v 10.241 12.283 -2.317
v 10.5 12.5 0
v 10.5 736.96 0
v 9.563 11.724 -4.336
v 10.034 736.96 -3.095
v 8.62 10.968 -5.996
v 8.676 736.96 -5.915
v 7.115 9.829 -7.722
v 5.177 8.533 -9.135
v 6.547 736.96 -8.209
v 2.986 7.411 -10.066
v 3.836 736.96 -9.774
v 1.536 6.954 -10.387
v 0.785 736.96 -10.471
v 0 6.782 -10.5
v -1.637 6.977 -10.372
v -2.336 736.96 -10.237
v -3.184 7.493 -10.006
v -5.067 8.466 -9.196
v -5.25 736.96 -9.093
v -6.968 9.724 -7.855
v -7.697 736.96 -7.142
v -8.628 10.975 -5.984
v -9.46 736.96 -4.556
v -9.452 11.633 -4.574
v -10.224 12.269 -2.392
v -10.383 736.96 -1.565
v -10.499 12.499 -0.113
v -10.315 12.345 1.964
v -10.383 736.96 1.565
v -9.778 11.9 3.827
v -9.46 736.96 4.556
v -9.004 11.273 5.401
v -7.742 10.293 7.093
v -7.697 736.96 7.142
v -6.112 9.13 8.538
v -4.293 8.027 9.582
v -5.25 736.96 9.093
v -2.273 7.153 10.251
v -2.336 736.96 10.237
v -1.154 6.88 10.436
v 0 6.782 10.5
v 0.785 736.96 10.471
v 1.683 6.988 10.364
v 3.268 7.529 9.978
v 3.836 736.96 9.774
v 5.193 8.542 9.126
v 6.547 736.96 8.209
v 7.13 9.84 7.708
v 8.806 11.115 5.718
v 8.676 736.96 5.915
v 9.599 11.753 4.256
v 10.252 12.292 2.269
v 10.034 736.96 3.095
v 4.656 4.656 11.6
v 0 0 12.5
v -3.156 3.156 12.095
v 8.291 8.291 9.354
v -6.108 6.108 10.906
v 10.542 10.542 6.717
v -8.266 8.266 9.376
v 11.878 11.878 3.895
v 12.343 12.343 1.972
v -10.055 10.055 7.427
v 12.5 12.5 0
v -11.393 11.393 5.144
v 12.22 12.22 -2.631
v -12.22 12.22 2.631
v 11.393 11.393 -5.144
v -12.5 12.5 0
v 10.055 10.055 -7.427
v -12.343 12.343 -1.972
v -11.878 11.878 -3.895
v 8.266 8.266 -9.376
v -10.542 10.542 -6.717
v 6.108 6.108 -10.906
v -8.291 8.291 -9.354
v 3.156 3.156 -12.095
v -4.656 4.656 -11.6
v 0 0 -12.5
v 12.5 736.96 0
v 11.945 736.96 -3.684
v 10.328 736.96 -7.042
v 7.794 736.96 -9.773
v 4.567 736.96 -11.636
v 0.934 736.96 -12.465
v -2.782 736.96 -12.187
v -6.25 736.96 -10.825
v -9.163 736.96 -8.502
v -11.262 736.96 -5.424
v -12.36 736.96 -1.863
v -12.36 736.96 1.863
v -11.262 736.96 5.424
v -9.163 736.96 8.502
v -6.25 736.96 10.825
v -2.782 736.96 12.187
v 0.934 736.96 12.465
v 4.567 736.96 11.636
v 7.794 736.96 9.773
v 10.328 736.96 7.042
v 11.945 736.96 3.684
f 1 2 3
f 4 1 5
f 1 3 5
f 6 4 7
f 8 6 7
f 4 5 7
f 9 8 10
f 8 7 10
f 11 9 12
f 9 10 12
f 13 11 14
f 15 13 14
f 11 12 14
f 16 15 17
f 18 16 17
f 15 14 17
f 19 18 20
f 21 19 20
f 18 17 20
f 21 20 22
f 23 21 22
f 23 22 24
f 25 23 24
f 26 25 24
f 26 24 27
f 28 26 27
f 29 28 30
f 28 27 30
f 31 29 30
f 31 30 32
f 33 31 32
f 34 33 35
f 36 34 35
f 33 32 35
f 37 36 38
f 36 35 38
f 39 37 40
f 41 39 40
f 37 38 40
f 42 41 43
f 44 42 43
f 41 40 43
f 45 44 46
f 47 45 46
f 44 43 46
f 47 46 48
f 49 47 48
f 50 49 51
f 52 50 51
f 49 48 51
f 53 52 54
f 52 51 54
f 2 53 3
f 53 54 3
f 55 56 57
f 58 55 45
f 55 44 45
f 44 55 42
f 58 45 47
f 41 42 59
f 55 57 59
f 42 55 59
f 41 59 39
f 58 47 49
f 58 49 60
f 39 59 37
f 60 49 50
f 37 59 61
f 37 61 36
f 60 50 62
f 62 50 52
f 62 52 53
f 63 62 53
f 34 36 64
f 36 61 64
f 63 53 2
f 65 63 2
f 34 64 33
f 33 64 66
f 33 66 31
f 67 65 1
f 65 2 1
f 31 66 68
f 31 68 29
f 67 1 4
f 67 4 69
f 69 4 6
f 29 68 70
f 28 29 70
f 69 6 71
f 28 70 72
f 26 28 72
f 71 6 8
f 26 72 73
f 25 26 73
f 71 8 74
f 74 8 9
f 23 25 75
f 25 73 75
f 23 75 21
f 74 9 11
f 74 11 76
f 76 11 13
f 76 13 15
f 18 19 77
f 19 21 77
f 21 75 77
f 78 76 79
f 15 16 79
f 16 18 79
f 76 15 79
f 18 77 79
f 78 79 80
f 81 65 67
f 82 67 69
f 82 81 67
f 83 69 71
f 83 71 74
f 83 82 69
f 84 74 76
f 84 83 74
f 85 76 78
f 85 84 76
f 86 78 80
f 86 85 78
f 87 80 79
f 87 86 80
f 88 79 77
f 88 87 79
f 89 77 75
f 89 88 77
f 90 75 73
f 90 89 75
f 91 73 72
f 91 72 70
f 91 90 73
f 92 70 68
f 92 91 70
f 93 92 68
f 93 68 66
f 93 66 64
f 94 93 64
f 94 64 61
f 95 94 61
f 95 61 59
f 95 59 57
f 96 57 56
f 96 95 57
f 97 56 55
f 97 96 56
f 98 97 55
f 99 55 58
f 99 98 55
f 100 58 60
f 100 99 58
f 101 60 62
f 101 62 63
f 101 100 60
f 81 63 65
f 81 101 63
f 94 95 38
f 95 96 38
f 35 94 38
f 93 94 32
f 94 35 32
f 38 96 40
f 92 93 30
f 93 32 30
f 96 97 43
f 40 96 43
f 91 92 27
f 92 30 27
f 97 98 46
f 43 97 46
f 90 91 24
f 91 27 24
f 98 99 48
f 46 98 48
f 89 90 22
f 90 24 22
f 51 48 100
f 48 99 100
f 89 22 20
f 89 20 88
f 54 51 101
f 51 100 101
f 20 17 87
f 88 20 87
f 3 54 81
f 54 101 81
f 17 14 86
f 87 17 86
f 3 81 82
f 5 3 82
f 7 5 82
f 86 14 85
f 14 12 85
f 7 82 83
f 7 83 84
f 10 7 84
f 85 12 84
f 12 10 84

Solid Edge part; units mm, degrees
sketch "Sketch1" plane through (0, 0, 0) normal (0, 0, 1) x (1, 0, 0)
  line L0 (0, 0) -> (0, 736.96)
  dimension "D1" = 736.96
sketch "Sketch2" plane through (0, 0, 0) normal (0, -1, 0) x (1, 0, 0)
  circle A0 centre (0, 0) radius 12.5
  dimension "D1" = 25
sweep "SweptProtrusion_1" add profiles "Sketch2" path "Sketch1"
shell "Thinwall_1" thickness 2 removed faces 2 at (-8.0833, 0, 8.5833) at (-8.0833, 736.96, 8.5833)
sketch "Sketch3" plane through (0, 0, 0) normal (1, 0, 0) x (0, 1, 0)
  circle A0 centre (0, 0) radius 12.5
  dimension "D1" = 25
extrude "Cutout1" cut sketch "Sketch3" along normal through all and the other way through all
properties material "Stainless steel"
